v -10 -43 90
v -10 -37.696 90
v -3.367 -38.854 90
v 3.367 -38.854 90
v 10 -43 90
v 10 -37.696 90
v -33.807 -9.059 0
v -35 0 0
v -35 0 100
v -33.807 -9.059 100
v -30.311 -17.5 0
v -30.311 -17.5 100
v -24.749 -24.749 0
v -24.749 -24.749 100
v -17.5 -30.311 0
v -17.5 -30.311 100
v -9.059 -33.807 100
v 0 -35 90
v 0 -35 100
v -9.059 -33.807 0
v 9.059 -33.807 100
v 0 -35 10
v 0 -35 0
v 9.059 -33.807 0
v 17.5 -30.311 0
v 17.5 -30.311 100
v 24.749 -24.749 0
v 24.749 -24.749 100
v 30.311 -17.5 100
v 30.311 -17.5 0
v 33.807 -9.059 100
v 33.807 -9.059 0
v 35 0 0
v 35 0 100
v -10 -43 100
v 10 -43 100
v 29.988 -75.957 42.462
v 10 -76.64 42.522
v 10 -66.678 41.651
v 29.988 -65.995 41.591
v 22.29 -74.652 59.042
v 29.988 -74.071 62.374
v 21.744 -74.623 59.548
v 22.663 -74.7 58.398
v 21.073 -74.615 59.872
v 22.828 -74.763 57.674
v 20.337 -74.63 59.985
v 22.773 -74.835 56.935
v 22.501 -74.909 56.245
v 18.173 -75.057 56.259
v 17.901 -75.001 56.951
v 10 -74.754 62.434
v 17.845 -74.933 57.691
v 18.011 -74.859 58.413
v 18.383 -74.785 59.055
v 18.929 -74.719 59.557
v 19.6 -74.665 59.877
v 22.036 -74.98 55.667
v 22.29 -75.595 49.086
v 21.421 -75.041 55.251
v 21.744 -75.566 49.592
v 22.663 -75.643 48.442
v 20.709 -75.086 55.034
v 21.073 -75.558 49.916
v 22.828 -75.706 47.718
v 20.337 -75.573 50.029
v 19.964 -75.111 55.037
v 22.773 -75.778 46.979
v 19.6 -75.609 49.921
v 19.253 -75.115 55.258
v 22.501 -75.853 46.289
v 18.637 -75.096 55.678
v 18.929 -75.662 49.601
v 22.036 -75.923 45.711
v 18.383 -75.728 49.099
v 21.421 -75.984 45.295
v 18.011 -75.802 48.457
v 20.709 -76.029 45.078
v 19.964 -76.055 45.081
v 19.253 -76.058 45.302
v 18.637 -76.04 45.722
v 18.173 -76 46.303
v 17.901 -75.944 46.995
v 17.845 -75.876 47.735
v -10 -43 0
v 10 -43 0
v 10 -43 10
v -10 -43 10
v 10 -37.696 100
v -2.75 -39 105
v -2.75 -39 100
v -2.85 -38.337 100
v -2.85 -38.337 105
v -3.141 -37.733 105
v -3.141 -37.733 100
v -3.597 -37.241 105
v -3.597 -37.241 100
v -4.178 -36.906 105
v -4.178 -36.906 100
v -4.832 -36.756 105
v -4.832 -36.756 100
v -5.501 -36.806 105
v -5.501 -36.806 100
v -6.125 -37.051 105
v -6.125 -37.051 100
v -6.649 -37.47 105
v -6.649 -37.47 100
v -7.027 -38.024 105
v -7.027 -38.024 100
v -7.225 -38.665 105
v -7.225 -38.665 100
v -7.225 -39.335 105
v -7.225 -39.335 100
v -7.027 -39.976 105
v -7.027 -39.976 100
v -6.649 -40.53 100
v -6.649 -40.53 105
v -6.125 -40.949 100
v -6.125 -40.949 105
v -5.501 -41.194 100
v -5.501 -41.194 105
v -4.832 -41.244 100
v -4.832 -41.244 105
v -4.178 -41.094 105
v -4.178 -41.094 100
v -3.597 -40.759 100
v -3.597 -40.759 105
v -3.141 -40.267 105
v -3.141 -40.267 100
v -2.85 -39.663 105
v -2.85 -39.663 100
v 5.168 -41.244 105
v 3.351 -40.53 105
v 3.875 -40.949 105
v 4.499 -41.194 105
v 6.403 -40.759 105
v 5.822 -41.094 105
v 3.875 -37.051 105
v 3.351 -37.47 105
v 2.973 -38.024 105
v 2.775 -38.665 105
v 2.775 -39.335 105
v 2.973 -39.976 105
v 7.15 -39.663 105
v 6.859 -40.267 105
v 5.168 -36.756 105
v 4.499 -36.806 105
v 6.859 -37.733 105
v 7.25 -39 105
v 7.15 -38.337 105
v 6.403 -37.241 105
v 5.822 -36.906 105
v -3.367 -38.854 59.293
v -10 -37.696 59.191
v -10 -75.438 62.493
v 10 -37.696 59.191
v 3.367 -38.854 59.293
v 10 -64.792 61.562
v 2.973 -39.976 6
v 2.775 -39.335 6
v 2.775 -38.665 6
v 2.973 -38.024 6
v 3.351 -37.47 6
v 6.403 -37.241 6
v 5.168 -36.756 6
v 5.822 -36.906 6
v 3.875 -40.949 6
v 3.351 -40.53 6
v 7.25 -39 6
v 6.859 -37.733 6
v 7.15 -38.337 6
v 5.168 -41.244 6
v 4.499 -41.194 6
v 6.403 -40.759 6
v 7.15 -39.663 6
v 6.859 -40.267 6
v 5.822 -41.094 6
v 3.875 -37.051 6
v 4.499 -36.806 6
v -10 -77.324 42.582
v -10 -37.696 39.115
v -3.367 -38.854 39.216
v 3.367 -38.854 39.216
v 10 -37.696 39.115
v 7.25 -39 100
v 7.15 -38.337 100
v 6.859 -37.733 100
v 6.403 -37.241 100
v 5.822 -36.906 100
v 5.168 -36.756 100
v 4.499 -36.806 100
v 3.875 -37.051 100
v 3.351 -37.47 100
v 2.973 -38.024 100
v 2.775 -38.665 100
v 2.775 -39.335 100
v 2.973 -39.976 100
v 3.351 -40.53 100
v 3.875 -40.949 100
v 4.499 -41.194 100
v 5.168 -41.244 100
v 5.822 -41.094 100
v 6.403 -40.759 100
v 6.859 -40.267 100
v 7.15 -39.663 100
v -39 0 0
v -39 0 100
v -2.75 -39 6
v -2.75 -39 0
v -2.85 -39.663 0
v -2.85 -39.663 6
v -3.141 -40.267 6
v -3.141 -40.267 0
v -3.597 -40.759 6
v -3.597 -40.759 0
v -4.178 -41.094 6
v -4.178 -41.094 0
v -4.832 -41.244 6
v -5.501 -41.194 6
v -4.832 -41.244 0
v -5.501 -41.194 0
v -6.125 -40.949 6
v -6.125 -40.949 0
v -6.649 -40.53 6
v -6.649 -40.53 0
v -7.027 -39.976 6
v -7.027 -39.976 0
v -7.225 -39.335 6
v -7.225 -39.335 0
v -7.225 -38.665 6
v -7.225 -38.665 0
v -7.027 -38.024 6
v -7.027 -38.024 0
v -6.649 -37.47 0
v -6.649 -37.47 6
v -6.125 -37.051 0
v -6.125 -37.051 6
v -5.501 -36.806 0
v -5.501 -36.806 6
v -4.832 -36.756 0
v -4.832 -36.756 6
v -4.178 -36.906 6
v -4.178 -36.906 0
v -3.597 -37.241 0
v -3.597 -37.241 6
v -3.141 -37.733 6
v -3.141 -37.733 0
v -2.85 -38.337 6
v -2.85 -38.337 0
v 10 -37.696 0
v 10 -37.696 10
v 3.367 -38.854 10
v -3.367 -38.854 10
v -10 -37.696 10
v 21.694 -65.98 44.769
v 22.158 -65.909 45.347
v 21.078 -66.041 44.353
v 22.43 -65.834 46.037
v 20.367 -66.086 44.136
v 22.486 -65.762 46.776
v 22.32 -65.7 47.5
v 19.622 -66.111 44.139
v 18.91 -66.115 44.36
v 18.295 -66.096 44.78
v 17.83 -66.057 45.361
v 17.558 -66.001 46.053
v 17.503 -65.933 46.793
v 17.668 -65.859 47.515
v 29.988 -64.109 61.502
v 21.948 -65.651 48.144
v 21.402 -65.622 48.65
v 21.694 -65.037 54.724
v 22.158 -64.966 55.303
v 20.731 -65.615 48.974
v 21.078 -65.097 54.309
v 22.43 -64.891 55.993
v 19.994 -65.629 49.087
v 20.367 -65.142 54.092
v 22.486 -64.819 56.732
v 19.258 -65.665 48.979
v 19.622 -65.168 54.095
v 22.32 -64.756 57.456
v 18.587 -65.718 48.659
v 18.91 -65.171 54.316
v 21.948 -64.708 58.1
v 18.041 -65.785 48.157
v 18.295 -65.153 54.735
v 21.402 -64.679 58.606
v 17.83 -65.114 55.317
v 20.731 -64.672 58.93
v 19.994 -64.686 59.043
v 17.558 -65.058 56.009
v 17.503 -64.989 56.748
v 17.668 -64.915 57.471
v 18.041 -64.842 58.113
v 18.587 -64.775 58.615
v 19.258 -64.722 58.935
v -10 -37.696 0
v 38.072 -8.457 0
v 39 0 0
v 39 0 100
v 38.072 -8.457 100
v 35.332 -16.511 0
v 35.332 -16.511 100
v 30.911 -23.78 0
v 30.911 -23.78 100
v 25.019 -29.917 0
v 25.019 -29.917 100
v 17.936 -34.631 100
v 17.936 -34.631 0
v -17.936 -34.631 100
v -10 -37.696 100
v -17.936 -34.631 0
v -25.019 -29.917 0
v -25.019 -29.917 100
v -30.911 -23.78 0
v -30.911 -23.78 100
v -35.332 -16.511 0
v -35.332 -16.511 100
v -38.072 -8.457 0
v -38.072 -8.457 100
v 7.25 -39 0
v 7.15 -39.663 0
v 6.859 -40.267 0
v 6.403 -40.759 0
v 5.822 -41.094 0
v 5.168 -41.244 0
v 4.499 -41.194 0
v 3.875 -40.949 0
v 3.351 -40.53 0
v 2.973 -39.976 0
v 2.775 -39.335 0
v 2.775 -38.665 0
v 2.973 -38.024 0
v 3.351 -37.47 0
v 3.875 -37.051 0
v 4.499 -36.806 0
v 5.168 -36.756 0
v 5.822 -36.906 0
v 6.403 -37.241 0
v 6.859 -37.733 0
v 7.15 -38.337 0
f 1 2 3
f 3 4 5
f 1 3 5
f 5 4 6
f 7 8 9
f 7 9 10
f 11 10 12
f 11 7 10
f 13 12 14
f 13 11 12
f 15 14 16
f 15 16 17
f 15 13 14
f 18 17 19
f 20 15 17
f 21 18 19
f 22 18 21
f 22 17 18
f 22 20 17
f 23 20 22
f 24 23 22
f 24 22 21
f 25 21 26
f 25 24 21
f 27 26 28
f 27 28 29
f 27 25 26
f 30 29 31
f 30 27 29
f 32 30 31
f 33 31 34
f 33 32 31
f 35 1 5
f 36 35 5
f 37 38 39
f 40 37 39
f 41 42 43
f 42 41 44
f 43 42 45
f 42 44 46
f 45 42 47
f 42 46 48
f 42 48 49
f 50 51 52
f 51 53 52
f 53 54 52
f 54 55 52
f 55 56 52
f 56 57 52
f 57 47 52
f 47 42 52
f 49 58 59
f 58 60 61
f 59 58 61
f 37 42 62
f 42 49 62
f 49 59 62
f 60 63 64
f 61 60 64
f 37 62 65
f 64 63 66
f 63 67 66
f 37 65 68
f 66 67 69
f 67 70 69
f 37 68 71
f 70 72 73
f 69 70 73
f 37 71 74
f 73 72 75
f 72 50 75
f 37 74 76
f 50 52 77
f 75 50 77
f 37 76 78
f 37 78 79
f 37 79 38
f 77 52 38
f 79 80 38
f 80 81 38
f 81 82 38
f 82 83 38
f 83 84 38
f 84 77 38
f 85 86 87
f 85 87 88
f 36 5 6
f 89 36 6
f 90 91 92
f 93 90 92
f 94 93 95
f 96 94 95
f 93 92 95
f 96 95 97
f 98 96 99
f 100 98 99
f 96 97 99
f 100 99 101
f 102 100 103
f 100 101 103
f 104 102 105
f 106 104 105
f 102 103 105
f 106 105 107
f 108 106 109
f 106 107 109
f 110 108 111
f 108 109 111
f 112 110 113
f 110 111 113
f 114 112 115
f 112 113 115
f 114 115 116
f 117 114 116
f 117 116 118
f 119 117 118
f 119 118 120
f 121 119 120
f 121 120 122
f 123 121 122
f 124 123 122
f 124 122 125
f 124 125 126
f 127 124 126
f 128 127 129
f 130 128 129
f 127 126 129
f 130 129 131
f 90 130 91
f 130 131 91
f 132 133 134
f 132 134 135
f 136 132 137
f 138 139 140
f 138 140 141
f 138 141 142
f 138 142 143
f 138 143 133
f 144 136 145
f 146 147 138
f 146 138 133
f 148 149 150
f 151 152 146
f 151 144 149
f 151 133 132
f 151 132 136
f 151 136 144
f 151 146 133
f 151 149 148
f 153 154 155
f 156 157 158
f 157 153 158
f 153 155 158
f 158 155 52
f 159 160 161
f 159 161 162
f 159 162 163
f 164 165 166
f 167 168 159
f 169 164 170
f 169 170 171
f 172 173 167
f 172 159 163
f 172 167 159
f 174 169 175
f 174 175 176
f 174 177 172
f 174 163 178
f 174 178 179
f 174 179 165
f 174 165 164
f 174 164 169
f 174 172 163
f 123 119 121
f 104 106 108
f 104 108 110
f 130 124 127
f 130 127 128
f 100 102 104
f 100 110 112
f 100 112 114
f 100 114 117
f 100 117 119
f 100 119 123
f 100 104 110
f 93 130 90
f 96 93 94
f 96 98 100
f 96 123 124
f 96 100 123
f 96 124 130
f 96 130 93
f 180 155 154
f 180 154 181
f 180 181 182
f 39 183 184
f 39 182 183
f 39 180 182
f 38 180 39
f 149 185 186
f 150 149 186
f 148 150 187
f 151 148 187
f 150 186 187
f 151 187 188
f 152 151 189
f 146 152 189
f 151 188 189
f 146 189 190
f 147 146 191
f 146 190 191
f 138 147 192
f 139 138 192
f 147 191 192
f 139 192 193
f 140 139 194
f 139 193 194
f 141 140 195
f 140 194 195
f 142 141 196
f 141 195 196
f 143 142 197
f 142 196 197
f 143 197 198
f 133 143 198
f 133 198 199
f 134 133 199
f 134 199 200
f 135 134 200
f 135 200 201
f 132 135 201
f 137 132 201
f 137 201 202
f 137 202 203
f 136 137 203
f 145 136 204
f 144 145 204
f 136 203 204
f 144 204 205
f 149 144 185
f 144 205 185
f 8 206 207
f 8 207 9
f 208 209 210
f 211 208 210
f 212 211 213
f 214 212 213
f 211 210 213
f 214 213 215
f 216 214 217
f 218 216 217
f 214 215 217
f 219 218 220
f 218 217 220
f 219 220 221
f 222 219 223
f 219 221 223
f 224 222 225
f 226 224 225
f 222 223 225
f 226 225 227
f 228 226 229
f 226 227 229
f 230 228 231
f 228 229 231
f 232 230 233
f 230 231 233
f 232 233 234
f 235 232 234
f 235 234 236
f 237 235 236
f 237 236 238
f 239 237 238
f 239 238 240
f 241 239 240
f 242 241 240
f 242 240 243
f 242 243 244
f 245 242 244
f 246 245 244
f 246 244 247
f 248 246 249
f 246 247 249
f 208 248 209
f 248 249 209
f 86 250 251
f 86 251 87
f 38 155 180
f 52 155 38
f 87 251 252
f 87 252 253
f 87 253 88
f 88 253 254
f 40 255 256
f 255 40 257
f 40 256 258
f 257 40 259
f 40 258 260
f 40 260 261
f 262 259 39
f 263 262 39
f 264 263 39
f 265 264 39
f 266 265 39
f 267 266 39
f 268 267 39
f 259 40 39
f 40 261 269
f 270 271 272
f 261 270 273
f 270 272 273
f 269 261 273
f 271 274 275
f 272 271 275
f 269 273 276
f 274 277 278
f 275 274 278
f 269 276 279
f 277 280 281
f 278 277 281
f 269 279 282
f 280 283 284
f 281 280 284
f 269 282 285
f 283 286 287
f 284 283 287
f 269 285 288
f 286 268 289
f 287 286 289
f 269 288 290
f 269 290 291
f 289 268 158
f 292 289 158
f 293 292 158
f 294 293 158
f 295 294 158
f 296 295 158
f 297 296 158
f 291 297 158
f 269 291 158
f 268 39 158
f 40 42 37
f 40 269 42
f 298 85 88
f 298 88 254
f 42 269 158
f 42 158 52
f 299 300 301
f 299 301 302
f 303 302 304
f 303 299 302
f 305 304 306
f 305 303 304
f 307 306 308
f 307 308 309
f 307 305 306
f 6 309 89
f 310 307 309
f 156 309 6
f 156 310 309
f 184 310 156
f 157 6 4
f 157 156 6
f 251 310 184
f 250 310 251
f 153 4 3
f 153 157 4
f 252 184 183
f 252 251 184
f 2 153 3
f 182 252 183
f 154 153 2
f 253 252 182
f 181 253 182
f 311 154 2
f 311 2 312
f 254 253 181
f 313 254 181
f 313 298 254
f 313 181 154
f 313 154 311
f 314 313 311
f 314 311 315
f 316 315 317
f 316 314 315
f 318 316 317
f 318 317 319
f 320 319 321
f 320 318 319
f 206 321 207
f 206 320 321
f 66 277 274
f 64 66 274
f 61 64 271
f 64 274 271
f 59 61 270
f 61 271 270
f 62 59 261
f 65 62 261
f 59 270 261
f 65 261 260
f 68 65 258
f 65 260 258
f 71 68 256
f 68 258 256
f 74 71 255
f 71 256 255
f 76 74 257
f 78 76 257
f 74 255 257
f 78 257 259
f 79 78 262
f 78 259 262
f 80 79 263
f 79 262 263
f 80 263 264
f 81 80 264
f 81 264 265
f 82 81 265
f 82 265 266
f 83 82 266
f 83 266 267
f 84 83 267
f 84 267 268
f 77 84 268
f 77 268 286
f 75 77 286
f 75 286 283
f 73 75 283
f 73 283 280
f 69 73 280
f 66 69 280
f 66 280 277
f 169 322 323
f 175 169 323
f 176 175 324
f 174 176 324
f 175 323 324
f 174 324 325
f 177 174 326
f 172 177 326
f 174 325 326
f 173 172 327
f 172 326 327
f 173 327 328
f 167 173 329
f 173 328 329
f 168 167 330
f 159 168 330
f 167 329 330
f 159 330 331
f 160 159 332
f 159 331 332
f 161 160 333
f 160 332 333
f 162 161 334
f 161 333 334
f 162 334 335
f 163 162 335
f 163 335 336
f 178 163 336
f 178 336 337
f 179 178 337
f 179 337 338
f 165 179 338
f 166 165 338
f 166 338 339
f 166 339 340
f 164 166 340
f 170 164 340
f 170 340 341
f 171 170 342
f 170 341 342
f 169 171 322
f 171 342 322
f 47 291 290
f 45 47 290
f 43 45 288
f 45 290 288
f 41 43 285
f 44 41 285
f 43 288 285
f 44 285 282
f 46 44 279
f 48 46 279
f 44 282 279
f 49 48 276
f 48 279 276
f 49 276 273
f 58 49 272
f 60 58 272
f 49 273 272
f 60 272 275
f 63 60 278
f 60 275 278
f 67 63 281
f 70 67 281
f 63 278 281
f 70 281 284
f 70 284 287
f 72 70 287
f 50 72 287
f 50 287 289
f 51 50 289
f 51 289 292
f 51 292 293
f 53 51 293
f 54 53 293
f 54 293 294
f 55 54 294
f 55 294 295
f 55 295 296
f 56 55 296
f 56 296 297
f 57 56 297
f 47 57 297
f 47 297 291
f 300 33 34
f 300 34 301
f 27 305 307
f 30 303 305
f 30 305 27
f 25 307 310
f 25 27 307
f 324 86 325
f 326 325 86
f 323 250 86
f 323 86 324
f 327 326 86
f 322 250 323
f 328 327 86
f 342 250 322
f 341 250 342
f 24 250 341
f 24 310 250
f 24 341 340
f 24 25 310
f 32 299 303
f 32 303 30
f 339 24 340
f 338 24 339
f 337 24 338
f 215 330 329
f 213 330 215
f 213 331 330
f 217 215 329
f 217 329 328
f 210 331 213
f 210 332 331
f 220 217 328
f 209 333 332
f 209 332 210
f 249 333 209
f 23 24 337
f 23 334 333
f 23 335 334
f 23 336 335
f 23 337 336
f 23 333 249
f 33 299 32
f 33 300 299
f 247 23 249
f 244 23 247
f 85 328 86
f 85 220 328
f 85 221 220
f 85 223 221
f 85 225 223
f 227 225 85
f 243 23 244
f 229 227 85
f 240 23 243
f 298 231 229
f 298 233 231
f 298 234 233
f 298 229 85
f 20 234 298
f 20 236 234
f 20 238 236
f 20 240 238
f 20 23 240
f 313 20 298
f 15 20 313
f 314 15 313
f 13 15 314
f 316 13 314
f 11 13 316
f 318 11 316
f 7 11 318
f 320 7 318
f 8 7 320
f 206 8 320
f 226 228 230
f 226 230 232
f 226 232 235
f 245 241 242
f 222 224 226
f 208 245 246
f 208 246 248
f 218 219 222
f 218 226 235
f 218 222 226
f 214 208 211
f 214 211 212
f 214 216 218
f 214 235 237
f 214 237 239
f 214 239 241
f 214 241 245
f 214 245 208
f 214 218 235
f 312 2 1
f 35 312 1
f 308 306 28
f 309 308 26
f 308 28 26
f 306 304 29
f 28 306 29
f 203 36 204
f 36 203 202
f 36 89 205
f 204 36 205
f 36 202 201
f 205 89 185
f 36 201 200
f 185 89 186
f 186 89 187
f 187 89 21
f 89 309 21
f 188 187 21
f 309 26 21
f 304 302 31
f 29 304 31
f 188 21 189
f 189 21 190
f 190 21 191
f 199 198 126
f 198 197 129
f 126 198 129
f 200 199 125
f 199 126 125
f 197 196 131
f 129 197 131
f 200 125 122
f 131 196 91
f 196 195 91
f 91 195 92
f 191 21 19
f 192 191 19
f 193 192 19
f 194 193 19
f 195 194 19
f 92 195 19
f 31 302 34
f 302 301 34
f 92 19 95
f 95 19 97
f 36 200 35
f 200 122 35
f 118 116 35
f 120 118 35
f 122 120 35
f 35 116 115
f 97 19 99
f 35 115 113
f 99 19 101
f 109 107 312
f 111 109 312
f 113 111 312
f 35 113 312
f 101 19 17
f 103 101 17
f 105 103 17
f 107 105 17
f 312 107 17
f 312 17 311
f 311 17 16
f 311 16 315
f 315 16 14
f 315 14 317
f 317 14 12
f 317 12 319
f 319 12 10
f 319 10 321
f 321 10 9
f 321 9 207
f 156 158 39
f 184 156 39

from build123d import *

# Parameters (mm, degrees)
EXTRUDE_THIN1_DEPTH       = 100
BOSS_EXTRUDE1_START       = -10
BOSS_EXTRUDE1_DEPTH       = 10
SKETCH3_R                 = 2.25
BOSS_EXTRUDE2_DEPTH       = 5
BOSS_EXTRUDE3_DEPTH       = 10
SKETCH5_R                 = 2.25
CUT_EXTRUDE1_DEPTH        = 6
BOSS_EXTRUDE4_REACH       = 121.416
BOSS_EXTRUDE4_END_RADIUS  = 39
SKETCH10_W                = 20
SKETCH10_H                = 20
BOSS_EXTRUDE5_START       = -29.189050103
BOSS_EXTRUDE5_OUTLINE_W   = 20
BOSS_EXTRUDE5_OUTLINE_H   = 20
BOSS_EXTRUDE5_DEPTH       = 29.189050103
BOSS_EXTRUDE5_START_2     = 80.604897745
BOSS_EXTRUDE5_2_OUTLINE_W = 23
BOSS_EXTRUDE5_2_OUTLINE_H = 23
BOSS_EXTRUDE5_2_DEPTH     = 1.395102255
BOSS_EXTRUDE6_DEPTH       = 20
SKETCH12_R                = 2.5
CUT_EXTRUDE2_DEPTH        = 20


with BuildPart() as part:
    # Sketch1 → Extrude-Thin1 (new body)
    with BuildSketch(Plane.XY):
        with BuildLine():
            ThreePointArc((-35, 0), (0, -35), (35, 0))
            Line((35, 0), (39, 0))
            ThreePointArc((39, 0), (0, -39), (-39, 0))
            Line((-39, 0), (-35, 0))
        make_face()
    extrude(amount=EXTRUDE_THIN1_DEPTH)

    # Sketch2 → Boss-Extrude1 (add)
    with BuildSketch(Plane.XY.offset(100).offset(BOSS_EXTRUDE1_START)):
        with BuildLine():
            Line((0, -39), (0, -35))
            Line((0, -35), (-10, -35))
            Line((-10, -35), (-10, -37.69615365))
            ThreePointArc((-10, -37.69615365), (-5.042321274, -38.672664715), (0, -39))
        make_face()
        with BuildLine():
            Line((10, -35), (0, -35))
            Line((0, -35), (0, -39))
            ThreePointArc((0, -39), (5.042321274, -38.672664715), (10, -37.69615365))
            Line((10, -37.69615365), (10, -35))
        make_face()
        with BuildLine():
            ThreePointArc((10, -37.69615365), (5.042321274, -38.672664715), (0, -39))
            ThreePointArc((0, -39), (-5.042321274, -38.672664715), (-10, -37.69615365))
            Line((-10, -37.69615365), (-10, -43))
            Line((-10, -43), (10, -43))
            Line((10, -43), (10, -37.69615365))
        make_face()
    extrude(amount=BOSS_EXTRUDE1_DEPTH)

    # Sketch3 → Boss-Extrude2 (add)
    with BuildSketch(Plane.XY.offset(100)):
        with Locations((-5, -39)):
            Circle(SKETCH3_R)
        with Locations((5, -39)):
            Circle(SKETCH3_R)
    extrude(amount=BOSS_EXTRUDE2_DEPTH)

    # Sketch4 → Boss-Extrude3 (add)
    with BuildSketch(Plane(origin=(0, 0, 0), x_dir=(-1, 0, 0), z_dir=(0, 0, -1))):
        with BuildLine():
            Line((0, -39), (0, -35))
            Line((0, -35), (-10, -35))
            Line((-10, -35), (-10, -37.69615365))
            ThreePointArc((-10, -37.69615365), (-5.042321274, -38.672664715), (0, -39))
        make_face()
        with BuildLine():
            ThreePointArc((10, -37.69615365), (5.042321274, -38.672664715), (0, -39))
            ThreePointArc((0, -39), (-5.042321274, -38.672664715), (-10, -37.69615365))
            Line((-10, -37.69615365), (-10, -43))
            Line((-10, -43), (10, -43))
            Line((10, -43), (10, -37.69615365))
        make_face()
        with BuildLine():
            Line((10, -35), (0, -35))
            Line((0, -35), (0, -39))
            ThreePointArc((0, -39), (5.042321274, -38.672664715), (10, -37.69615365))
            Line((10, -37.69615365), (10, -35))
        make_face()
    extrude(amount=-BOSS_EXTRUDE3_DEPTH)

    # Sketch5 → Cut-Extrude1 (cut)
    with BuildSketch(Plane(origin=(0, 0, 0), x_dir=(-1, 0, 0), z_dir=(0, 0, -1))):
        with Locations(Location((-5, -39, 0), (0, 0, 180))):
            Circle(SKETCH5_R)
        with Locations(Location((5, -39, 0), (0, 0, 180))):
            Circle(SKETCH5_R)
    extrude(amount=-CUT_EXTRUDE1_DEPTH, mode=Mode.SUBTRACT)

    # Boss-Extrude4: up to this cylinder (the profile starts outside it)
    boss_extrude4_end = Plane(origin=(0, 0, 50), z_dir=(0, 0, -1)) * Cylinder(BOSS_EXTRUDE4_END_RADIUS, 321.832, mode=Mode.PRIVATE)
    # Sketch10 → Boss-Extrude4 (add, up to the surface)
    with BuildSketch(Plane(origin=(0, -51.355775573, 4.493048169), x_dir=(1, 0, 0), z_dir=(0, 0.9961946980917462, -0.08715574274765152)), mode=Mode.PRIVATE) as boss_extrude4_sk1:
        with Locations((0, -45.680780994)):
            Rectangle(SKETCH10_W, SKETCH10_H)
    boss_extrude4_tool1 = extrude(boss_extrude4_sk1.sketch, amount=BOSS_EXTRUDE4_REACH, mode=Mode.PRIVATE) - boss_extrude4_end
    add(boss_extrude4_tool1.solids().sort_by_distance((0, -47.374433, 50))[0])

    # Boss-Extrude5: read off the stored shape, not the designer's step
    # Boss-Extrude5 outline → Boss-Extrude5 (add)
    with BuildSketch(Plane(origin=(0, -51.355775573, 4.493048169), x_dir=(1, 0, 0), z_dir=(0, 0.9961946980917462, -0.08715574274765152)).offset(BOSS_EXTRUDE5_START)):
        with Locations((0, -45.680780994)):
            Rectangle(BOSS_EXTRUDE5_OUTLINE_W, BOSS_EXTRUDE5_OUTLINE_H)
    extrude(amount=BOSS_EXTRUDE5_DEPTH)

    # Boss-Extrude5 2 outline → Boss-Extrude5 2 (cut)
    with BuildSketch(Plane(origin=(0, 0, 0), x_dir=(0.9994119135527714, 0.034137480457277325, -0.0032341114416132855), z_dir=(0.03429033462636031, -0.994956889147722, 0.09426007473315588)).offset(BOSS_EXTRUDE5_START_2)):
        with Locations((-2.5, 45.5)):
            Rectangle(BOSS_EXTRUDE5_2_OUTLINE_W, BOSS_EXTRUDE5_2_OUTLINE_H)
    extrude(amount=BOSS_EXTRUDE5_2_DEPTH, mode=Mode.SUBTRACT)

    # Sketch11 → Boss-Extrude6 (add, along a direction that is not the sketch's normal)
    with BuildSketch(Plane(origin=(10, 0, 0), x_dir=(0, 0, -1), z_dir=(1, 0, 0))):
        Polygon((-62.433599326, -74.753991325), (-42.522237652, -76.640350885), (-41.650680224, -66.678403904), (-61.562041898, -64.792044344), align=None)
    extrude(amount=BOSS_EXTRUDE6_DEPTH, dir=(0.999411883181242, 0.034160731366775, -0.002988676732389044))

    # Sketch12 → Cut-Extrude2 (cut)
    with BuildSketch(Plane(origin=(2.421276084, -70.254937612, 6.655801615), x_dir=(0.9994101830326217, 0.033961906388074226, -0.00508674406564492), z_dir=(-0.03429033462636031, 0.994956889147722, -0.09426007473315609))):
        with Locations(Location((17.489772292, -50.21182287, 0), (0, 0, 269.893376297))):
            Circle(SKETCH12_R)
        with Locations(Location((17.508382589, -40.211323595, 0), (0, 0, 269.893376297))):
            Circle(SKETCH12_R)
    extrude(amount=-CUT_EXTRUDE2_DEPTH, mode=Mode.SUBTRACT)


solid = part.part
